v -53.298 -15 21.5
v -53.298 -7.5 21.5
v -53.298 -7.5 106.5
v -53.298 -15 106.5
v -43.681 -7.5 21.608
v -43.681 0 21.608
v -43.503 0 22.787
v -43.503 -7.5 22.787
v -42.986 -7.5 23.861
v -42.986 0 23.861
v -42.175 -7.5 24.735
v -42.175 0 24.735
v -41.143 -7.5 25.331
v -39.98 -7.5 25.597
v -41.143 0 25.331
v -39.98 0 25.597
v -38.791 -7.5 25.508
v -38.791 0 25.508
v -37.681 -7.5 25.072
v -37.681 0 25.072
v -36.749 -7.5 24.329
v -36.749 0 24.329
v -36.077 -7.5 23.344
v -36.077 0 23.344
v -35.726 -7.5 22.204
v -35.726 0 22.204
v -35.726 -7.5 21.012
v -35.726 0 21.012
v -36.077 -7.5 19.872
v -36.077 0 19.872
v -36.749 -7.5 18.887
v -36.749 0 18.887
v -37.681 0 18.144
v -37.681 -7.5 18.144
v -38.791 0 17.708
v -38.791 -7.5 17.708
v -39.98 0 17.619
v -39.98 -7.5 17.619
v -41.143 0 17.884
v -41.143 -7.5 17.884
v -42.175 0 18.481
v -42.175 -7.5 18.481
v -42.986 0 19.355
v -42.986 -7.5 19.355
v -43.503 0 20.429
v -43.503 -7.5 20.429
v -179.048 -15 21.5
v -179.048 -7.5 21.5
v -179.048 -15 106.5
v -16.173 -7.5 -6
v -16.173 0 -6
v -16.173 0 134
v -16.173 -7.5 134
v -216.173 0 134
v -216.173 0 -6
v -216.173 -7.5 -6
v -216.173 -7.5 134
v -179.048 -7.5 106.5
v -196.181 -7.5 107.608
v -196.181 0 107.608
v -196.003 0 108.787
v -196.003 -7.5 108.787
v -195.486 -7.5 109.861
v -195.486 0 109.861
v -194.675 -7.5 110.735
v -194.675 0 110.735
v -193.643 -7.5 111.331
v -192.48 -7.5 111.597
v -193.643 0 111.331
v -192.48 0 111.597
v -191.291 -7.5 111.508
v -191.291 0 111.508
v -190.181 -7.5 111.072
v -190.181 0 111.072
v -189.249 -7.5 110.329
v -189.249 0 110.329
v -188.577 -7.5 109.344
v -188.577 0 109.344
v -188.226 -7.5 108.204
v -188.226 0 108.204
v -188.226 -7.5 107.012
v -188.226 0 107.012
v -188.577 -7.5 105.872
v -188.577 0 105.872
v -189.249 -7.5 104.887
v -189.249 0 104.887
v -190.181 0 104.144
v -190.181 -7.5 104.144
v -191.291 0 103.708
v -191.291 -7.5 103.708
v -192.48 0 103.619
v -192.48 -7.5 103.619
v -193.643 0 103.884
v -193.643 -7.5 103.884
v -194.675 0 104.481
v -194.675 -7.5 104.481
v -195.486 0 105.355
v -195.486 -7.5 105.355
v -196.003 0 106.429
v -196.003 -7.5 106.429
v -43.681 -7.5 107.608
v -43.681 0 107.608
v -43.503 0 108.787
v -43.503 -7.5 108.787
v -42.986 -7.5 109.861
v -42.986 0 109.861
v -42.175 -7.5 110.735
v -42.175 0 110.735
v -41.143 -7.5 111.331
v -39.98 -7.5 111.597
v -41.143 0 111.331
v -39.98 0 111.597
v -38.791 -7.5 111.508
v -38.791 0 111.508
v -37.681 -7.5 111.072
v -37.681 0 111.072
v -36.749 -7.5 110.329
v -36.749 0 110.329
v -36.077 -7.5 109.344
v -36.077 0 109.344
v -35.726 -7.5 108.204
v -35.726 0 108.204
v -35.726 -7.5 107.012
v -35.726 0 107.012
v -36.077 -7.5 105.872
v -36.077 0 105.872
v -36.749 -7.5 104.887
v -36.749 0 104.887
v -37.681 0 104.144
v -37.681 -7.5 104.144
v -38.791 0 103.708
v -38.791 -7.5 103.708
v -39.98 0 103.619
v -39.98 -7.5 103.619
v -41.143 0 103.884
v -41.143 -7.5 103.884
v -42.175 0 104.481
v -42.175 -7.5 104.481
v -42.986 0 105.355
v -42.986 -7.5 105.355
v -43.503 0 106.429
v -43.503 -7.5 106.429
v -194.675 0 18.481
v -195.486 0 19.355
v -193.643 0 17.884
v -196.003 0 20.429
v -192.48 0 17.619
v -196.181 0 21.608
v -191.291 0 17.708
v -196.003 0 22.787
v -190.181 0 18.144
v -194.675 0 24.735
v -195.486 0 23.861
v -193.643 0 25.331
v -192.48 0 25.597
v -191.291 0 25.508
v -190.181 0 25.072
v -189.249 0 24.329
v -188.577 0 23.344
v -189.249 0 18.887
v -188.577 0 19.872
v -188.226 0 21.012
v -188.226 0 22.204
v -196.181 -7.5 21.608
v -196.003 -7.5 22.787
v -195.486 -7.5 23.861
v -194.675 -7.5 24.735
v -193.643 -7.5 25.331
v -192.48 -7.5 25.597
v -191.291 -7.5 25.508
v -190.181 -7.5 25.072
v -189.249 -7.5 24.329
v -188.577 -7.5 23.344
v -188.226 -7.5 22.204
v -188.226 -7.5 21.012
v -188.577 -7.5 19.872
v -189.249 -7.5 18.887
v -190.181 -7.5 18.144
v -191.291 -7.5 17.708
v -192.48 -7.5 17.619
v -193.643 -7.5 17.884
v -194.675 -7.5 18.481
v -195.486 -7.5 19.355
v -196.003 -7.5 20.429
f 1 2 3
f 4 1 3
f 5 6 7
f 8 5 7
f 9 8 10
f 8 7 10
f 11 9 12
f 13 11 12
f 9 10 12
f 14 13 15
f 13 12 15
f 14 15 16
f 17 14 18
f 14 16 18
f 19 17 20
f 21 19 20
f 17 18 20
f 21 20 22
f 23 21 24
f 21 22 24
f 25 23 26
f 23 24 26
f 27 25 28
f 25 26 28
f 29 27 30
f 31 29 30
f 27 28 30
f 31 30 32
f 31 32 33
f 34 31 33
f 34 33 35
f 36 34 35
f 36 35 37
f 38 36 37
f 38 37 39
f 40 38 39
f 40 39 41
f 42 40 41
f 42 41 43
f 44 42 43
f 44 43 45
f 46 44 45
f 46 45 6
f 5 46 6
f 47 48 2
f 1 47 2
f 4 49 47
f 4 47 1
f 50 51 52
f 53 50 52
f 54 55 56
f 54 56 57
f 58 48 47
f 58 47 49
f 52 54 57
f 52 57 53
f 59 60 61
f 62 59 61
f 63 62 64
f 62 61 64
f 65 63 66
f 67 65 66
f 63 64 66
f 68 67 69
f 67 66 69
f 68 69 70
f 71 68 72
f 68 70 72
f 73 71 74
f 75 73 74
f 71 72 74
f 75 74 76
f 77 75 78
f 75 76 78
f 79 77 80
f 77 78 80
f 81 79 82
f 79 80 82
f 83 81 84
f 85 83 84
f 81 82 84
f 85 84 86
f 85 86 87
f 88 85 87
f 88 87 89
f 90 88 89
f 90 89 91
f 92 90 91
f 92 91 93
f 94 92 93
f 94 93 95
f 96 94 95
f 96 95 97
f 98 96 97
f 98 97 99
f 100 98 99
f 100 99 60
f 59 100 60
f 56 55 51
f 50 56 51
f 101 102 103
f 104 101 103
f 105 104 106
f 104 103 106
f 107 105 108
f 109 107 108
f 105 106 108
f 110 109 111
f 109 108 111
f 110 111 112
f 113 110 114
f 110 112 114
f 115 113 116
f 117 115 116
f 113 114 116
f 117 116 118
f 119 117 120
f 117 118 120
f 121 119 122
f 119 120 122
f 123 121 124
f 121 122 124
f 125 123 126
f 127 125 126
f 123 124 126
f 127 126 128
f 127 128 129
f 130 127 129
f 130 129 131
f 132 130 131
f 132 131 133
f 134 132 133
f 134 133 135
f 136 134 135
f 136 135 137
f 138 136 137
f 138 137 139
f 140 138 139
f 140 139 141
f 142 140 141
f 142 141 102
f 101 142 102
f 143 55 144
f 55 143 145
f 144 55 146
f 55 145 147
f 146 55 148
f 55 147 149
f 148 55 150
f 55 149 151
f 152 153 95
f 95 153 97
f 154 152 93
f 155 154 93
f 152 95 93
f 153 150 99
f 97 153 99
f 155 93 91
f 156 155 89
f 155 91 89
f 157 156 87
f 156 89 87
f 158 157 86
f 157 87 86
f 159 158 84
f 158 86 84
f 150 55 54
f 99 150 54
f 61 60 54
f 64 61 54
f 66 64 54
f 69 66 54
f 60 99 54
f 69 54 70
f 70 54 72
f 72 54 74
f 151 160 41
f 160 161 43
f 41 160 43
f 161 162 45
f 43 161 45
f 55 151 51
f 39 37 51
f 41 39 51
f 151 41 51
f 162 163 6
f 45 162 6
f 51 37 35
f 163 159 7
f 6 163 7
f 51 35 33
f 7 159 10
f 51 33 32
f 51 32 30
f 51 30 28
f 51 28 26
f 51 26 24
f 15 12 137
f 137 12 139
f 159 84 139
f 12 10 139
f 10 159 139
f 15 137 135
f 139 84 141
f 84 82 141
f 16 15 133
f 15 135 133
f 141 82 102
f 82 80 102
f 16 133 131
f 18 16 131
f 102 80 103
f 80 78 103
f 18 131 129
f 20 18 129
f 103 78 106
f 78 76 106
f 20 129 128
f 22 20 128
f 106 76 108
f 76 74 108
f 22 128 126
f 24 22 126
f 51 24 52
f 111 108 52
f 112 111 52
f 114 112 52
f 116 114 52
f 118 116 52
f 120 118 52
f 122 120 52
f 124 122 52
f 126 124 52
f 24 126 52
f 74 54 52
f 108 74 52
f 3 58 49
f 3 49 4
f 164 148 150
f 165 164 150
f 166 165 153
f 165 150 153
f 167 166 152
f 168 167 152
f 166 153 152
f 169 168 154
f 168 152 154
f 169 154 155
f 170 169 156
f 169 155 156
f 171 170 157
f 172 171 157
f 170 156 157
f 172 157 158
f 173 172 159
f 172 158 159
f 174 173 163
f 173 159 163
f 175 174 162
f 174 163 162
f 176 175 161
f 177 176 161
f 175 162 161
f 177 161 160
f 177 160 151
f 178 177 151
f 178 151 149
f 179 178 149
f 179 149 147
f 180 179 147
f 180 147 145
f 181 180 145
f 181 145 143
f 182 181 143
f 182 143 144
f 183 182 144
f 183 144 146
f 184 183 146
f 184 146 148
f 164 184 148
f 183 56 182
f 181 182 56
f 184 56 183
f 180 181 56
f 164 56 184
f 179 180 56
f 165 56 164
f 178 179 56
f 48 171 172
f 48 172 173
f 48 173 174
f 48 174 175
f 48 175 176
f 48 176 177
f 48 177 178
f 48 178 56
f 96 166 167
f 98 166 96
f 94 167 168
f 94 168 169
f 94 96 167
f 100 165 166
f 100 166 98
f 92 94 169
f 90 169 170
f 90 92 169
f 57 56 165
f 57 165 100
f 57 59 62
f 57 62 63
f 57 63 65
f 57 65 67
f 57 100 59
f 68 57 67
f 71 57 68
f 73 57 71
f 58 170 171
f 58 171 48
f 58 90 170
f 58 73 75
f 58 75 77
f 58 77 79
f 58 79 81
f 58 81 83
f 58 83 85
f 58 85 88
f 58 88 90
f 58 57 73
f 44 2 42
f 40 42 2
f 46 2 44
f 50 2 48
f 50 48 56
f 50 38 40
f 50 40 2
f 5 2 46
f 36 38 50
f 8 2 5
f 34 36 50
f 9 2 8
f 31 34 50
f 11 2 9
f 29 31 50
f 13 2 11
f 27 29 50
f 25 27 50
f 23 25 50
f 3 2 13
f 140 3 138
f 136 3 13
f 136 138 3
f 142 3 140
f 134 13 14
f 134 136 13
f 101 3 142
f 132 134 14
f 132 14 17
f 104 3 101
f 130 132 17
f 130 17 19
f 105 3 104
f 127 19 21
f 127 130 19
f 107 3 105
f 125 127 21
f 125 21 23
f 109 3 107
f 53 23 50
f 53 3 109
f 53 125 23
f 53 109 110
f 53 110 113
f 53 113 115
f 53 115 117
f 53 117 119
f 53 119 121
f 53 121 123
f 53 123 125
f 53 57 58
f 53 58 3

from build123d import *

# Parameters (mm, degrees)
F0_W     = 200
F0_H     = 140
F0_W_2   = 125.75
F0_H_2   = 85
F1_DEPTH = 7.5
F3_D     = 8
F3_DEPTH = 12
F4_DEPTH = 15


with BuildPart() as f1:
    # F0 (on Front) → F1 (new body)
    with BuildSketch(Plane.XZ):
        with Locations((-116.173333, 64.000176)):
            Rectangle(F0_W, F0_H)
        with Locations((-116.173333, 64.000176)):
            Rectangle(F0_W_2, F0_H_2, mode=Mode.SUBTRACT)
    extrude(amount=F1_DEPTH)

    # F3
    with Locations(Plane.XZ.offset(7.5)):
        with Locations((-39.681189, 21.607968), (-192.181189, 21.607968), (-192.181189, 107.607968), (-39.681189, 107.607968)):
            Hole(F3_D / 2, depth=F3_DEPTH)

    # F0 (on Front) → F4 (join)
    with BuildSketch(Plane.XZ):
        with Locations((-116.173333, 64.000176)):
            Rectangle(F0_W_2, F0_H_2)
    extrude(amount=F4_DEPTH)


solid = f1.part
